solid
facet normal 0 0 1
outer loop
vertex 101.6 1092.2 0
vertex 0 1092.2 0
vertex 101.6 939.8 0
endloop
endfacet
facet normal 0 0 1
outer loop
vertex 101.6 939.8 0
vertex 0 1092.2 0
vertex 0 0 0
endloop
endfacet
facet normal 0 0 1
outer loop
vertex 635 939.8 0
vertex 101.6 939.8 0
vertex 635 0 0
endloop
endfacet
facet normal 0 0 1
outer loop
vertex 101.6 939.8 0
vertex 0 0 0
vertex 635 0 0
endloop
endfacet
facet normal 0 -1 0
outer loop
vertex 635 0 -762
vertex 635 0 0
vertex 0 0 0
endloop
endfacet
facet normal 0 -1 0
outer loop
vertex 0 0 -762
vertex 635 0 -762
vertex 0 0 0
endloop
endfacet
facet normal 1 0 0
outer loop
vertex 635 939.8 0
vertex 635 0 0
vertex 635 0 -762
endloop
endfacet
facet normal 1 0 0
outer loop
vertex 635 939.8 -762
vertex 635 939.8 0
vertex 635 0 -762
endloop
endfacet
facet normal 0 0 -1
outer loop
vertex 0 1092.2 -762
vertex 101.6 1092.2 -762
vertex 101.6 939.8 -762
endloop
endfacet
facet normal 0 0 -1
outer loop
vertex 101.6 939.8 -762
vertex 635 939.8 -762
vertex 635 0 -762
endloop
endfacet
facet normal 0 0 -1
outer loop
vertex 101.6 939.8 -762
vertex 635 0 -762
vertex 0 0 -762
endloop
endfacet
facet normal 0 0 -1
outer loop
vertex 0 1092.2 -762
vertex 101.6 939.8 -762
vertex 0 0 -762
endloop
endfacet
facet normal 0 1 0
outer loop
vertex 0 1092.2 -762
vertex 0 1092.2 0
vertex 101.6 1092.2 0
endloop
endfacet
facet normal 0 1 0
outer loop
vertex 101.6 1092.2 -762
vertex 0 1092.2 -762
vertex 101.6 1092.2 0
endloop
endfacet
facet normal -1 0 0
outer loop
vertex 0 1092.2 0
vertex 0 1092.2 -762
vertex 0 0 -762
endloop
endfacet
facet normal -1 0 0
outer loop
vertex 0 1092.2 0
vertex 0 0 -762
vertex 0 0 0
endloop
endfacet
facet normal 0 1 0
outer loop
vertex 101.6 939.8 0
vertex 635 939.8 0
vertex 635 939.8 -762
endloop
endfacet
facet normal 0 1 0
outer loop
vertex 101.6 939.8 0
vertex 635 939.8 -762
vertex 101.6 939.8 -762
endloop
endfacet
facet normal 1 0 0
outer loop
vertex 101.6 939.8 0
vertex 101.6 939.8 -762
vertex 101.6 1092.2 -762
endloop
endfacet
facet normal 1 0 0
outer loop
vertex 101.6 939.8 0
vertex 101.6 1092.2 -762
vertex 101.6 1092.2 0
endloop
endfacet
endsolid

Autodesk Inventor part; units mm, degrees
ref_plane "YZ Plane" through (0, 0, 0) normal (1, 0, 0) x (0, 1, 0)
ref_plane "XZ Plane" through (0, 0, 0) normal (0, 1, 0) x (-1, 0, 0)
ref_plane "XY Plane" through (0, 0, 0) normal (0, 0, 1) x (1, 0, 0)
sketch "Sketch1" plane through (0, 0, 0) normal (0, 1, 0) x (-1, 0, 0)
  line L0 (0, 0) -> (-635, 0)
  line L1 (-635, 0) -> (-635, -762)
  line L2 (-635, -762) -> (0, -762)
  line L3 (0, -762) -> (0, 0)
  dimension "d4" = 762
  dimension "d5" = 635
extrude "Extrusion1" add sketch "Sketch1" along normal blind 939.8
sketch "Sketch2" plane through (0, 939.8, 0) normal (0, 1, 0) x (1, 0, 0)
  line L0 (0, 762) -> (0, 0) projected
  line L1 (0, 0) -> (635, 0) projected
  line L2 (0, 762) -> (101.6, 762)
  line L3 (101.6, 762) -> (101.6, 0)
  line L4 (101.6, 0) -> (0, 0)
  line L5 (0, 0) -> (0, 762)
  dimension "d6" = 101.6
extrude "Extrusion2" add sketch "Sketch2" along normal blind 152.4
properties part number "Stove" material "Stainless Steel"
